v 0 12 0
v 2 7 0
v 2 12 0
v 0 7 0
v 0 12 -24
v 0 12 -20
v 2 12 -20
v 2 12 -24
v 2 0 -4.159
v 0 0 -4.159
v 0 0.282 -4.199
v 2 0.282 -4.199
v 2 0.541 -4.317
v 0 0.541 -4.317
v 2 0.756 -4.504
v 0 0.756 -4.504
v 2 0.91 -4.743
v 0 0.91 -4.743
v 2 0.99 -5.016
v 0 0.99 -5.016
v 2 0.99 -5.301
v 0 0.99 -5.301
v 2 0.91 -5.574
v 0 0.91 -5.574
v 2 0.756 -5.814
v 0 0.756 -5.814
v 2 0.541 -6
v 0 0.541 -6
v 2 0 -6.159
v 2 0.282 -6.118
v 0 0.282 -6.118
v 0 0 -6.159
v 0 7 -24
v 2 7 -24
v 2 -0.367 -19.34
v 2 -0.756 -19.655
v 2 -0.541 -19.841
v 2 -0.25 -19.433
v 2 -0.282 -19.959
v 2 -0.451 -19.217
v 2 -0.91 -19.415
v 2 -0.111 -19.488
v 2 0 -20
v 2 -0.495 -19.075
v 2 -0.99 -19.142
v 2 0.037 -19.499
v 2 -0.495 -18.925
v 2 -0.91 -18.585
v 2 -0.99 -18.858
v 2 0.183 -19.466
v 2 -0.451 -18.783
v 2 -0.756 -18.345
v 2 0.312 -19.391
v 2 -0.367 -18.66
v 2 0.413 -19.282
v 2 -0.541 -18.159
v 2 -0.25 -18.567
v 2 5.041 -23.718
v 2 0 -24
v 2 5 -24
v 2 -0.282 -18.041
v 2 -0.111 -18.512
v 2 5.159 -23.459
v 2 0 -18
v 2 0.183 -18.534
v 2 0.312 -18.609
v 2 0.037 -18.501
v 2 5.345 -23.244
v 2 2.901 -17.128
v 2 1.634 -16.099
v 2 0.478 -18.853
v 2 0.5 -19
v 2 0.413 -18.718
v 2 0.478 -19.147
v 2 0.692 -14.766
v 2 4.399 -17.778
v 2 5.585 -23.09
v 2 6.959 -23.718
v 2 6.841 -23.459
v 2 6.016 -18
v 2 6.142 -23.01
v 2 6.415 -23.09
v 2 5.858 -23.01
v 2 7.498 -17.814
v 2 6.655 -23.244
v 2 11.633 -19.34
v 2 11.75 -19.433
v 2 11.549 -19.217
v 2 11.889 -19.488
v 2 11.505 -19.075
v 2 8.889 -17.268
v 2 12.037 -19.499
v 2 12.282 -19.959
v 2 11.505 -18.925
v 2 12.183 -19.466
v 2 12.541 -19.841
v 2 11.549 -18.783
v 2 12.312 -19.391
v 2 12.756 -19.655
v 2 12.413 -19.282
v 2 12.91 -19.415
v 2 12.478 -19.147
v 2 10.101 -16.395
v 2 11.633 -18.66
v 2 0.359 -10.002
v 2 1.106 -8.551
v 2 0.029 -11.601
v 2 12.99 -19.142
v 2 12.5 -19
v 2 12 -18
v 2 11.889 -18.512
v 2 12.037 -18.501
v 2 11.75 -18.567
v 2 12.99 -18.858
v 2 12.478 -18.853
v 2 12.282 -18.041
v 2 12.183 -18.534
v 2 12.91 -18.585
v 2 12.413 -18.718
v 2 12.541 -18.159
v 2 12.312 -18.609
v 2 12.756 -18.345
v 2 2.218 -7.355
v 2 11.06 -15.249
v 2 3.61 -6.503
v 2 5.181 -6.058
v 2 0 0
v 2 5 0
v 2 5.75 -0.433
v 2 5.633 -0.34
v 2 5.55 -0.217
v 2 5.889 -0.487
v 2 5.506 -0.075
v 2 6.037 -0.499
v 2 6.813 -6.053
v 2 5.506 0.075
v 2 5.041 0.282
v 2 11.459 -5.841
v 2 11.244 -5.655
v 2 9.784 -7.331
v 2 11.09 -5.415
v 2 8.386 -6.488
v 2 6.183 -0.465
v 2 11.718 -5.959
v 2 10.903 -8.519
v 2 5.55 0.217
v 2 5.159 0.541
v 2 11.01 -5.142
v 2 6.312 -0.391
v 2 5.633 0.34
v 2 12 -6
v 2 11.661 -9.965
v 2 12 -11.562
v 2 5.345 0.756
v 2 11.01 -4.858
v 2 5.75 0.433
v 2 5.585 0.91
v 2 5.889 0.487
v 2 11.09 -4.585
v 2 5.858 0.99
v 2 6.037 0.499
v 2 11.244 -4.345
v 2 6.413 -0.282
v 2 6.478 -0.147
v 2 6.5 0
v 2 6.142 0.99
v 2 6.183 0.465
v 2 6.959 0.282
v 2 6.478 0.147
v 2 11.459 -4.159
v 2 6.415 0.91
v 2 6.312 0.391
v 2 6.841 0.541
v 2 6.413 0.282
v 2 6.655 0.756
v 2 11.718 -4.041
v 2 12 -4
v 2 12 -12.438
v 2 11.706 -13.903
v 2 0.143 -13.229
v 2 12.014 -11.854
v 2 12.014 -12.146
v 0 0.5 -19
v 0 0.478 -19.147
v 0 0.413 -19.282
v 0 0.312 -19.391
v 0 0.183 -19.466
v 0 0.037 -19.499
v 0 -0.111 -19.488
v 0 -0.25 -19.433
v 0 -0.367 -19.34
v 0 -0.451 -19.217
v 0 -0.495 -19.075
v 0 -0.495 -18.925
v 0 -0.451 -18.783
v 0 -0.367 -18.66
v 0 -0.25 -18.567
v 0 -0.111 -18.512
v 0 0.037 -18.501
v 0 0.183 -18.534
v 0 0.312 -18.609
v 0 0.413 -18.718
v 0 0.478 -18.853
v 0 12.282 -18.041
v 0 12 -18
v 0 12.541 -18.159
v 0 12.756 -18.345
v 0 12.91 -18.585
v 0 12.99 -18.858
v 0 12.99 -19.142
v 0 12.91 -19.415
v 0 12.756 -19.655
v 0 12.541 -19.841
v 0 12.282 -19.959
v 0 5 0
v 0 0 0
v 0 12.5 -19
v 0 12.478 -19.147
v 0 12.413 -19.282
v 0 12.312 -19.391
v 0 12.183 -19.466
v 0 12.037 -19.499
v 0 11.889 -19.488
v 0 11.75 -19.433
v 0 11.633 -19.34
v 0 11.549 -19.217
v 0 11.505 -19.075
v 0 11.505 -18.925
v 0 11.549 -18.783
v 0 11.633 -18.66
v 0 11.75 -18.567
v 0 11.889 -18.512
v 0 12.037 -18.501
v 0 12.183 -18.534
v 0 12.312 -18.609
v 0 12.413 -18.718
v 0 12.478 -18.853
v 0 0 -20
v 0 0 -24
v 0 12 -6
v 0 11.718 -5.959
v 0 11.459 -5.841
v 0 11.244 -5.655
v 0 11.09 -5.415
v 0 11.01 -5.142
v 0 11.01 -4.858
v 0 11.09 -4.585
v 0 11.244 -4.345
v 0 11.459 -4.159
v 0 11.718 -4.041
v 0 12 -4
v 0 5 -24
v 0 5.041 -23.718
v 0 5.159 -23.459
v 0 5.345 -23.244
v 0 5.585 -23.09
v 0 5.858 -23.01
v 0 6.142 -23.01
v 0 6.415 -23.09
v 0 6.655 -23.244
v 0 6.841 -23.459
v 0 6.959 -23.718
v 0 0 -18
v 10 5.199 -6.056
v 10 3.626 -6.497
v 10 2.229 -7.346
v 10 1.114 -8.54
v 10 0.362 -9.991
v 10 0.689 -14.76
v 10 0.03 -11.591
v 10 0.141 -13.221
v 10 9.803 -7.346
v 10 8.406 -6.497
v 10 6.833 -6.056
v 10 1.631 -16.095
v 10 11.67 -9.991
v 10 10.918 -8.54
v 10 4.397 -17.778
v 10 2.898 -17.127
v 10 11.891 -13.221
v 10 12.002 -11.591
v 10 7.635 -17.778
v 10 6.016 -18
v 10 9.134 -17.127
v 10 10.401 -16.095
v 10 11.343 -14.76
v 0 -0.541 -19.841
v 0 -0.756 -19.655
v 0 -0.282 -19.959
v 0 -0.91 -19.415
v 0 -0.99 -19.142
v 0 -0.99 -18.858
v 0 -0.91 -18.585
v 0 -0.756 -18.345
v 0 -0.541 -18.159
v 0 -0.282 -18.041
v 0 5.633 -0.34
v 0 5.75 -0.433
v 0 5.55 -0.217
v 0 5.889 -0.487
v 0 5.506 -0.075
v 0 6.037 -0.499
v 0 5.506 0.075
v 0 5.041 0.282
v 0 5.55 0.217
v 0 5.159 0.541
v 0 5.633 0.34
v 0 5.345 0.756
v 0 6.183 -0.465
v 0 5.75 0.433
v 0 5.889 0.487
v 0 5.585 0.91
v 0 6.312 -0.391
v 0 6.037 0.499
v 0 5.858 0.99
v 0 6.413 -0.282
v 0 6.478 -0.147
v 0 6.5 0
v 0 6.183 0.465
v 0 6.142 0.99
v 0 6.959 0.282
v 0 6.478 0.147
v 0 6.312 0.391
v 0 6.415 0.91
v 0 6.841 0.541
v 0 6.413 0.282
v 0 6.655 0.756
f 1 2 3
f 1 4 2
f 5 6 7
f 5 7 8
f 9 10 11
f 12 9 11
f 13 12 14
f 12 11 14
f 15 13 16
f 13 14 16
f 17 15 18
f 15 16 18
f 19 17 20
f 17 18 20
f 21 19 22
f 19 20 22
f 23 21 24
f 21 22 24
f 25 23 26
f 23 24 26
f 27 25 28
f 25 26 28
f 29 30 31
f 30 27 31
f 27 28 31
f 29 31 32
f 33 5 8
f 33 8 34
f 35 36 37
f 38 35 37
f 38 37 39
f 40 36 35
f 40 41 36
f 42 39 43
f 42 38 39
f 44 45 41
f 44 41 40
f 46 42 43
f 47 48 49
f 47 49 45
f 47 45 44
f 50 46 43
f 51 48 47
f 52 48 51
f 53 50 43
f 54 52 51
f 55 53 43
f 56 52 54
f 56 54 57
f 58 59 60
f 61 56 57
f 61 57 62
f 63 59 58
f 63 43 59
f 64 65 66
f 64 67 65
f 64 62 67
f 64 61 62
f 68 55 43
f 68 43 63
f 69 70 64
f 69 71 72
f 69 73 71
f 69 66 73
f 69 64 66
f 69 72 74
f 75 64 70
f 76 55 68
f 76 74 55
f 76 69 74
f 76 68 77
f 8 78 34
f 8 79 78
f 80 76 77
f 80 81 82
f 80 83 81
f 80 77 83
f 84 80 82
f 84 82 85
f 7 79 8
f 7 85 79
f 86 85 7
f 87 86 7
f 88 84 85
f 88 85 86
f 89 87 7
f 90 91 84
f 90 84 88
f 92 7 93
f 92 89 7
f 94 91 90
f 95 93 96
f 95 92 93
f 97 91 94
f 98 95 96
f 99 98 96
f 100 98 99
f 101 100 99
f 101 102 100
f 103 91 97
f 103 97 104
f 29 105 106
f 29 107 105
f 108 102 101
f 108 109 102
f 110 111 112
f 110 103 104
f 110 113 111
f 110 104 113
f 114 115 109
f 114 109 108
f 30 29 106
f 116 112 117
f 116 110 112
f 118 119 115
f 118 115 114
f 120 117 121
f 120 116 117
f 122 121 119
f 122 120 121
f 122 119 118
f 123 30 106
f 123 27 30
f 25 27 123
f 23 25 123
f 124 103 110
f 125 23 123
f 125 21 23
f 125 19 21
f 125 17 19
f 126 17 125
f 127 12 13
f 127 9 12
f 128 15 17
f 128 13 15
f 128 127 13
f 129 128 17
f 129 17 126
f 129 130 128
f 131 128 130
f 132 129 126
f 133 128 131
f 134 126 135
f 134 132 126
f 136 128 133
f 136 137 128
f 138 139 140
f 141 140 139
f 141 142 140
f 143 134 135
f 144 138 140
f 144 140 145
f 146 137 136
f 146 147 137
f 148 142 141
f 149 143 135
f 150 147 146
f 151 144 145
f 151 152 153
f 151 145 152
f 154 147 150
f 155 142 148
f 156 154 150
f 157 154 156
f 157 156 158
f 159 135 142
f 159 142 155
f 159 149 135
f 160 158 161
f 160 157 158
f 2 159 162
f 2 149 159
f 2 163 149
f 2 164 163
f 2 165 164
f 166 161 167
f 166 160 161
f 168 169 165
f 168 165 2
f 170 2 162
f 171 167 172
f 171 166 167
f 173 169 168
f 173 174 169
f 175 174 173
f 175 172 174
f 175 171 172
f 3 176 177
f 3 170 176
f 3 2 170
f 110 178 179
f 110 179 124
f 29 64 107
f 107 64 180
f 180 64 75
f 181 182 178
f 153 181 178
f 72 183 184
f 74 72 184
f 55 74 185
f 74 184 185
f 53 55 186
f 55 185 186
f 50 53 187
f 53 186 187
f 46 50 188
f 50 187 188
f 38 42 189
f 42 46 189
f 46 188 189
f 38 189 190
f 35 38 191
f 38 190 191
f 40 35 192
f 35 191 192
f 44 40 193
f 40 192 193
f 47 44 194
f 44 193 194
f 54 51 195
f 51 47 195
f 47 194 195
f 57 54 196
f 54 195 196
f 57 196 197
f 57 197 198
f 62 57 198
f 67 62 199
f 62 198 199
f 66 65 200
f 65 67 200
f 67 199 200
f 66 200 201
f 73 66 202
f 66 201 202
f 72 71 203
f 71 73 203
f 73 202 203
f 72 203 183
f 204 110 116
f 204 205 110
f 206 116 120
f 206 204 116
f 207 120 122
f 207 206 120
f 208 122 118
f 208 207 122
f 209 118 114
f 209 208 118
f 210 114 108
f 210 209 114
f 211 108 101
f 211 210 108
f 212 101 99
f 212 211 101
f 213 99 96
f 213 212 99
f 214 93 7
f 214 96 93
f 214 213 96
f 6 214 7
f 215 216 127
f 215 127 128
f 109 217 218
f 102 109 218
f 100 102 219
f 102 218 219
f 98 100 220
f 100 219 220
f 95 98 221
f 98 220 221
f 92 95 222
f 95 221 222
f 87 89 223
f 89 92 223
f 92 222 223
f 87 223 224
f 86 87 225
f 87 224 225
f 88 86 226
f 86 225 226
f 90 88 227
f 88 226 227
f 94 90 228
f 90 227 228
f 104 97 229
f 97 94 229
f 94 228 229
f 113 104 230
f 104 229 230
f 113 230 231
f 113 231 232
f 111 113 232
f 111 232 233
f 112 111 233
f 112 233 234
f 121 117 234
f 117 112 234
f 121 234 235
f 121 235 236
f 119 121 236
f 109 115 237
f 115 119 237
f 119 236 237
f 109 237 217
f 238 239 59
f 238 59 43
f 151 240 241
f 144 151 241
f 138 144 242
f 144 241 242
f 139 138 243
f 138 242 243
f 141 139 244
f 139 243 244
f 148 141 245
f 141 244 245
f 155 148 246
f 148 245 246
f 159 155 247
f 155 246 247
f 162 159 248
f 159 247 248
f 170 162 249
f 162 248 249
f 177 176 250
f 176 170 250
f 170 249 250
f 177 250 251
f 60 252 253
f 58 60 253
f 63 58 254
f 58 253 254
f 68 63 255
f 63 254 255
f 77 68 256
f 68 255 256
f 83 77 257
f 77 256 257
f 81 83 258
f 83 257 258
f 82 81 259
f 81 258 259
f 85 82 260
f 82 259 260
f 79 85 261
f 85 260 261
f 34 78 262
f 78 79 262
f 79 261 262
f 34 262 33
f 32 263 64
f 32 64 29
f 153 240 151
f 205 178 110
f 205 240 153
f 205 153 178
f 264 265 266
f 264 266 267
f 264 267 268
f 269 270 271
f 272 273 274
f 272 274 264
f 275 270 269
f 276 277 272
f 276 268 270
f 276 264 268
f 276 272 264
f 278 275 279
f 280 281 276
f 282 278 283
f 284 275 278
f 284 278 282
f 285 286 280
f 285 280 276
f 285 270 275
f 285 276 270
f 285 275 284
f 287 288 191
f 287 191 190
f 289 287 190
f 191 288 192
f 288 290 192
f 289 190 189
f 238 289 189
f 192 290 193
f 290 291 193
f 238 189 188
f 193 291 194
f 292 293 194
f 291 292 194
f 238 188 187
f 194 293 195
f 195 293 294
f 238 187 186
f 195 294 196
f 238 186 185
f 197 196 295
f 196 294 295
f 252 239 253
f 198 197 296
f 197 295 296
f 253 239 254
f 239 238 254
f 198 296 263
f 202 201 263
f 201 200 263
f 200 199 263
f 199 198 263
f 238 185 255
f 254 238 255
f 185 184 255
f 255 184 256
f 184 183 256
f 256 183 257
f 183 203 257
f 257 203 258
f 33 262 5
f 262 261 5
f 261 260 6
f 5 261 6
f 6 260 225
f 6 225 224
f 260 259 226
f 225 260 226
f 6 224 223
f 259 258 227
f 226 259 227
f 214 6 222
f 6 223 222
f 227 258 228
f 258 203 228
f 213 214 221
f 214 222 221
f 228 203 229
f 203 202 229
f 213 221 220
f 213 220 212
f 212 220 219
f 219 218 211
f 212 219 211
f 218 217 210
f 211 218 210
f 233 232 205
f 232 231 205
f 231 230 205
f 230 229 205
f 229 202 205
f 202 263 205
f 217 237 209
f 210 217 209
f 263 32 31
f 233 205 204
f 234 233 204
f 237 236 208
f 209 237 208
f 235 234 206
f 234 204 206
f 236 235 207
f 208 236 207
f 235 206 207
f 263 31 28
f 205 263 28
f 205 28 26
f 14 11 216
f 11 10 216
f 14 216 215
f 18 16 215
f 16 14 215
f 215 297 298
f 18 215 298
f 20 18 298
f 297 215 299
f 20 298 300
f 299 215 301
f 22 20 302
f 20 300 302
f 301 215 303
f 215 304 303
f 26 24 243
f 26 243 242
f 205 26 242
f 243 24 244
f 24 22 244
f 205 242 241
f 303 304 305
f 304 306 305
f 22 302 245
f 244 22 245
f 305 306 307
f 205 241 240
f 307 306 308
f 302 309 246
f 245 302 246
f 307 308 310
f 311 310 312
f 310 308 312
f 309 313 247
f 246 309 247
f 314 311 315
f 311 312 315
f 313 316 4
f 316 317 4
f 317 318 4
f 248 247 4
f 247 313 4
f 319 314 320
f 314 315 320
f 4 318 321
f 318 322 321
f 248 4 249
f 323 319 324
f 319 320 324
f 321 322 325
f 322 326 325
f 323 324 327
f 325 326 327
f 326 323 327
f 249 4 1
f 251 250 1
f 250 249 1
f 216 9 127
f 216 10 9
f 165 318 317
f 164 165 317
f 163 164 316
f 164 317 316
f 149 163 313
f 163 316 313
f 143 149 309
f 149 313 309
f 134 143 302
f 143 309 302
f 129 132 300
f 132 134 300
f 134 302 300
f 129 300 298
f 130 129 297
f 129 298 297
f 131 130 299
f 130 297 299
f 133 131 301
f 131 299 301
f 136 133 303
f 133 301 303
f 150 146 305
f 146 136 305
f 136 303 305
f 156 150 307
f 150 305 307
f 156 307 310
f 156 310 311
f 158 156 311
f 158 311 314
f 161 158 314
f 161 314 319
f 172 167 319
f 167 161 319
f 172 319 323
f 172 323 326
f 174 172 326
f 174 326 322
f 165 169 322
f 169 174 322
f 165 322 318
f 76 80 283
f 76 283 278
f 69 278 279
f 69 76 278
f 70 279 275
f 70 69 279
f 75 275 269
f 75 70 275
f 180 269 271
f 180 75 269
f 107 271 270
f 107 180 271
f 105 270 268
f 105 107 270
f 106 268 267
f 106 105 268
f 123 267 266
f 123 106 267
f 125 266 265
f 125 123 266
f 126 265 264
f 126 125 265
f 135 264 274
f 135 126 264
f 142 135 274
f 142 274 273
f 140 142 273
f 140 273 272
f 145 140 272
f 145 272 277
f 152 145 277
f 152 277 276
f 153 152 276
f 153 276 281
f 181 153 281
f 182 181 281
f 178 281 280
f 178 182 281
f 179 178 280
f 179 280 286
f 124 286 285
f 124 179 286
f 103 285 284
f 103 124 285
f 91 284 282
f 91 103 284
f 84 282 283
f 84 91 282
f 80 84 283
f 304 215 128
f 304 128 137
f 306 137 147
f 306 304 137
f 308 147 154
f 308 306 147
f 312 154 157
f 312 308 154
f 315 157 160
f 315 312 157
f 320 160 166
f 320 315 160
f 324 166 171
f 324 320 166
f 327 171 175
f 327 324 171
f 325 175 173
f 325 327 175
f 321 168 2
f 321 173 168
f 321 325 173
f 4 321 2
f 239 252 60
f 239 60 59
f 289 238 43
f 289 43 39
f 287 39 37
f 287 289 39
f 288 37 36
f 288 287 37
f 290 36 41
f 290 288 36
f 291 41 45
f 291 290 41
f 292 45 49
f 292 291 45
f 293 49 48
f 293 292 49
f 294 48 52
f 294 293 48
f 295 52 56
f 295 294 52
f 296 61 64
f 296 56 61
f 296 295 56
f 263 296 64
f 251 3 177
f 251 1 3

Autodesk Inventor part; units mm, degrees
ref_plane "YZ Plane" through (0, 0, 0) normal (1, 0, 0) x (0, 1, 0)
ref_plane "XZ Plane" through (0, 0, 0) normal (0, 1, 0) x (-1, 0, 0)
ref_plane "XY Plane" through (0, 0, 0) normal (0, 0, 1) x (1, 0, 0)
sketch "Náčrt1" plane through (0, 0, 0) normal (1, 0, 0) x (0, 1, 0)
  arc A0 (12, -4) -> (12, -6) centre (12, -5) ccw
  arc A1 (0, -6.1587) -> (0, -4.1587) centre (0, -5.1587) ccw
  arc A2 (12, -20) -> (12, -18) centre (12, -19) ccw
  arc A3 (0, -18) -> (0, -20) centre (0, -19) ccw
  line L0 (0, -4.1587) -> (0, 0)
  line L1 (12, 0) -> (12, -4)
  line L2 (12, -6) -> (12, -18)
  line L3 (12, -20) -> (12, -24)
  line L4 (0, -24) -> (0, -20)
  line L5 (0, -18) -> (0, -6.1587)
  circle A4 centre (12, -19) radius 0.5002
  circle A5 centre (0, -19) radius 0.5002
  arc A6 (7, 0) -> (5, 0) centre (6, 0) ccw
  line L6 (0, 0) -> (5, 0)
  line L7 (7, 0) -> (12, 0)
  circle A7 centre (6, 0) radius 0.5
  arc A8 (7, -24) -> (5, -24) centre (6, -24) ccw
  line L8 (12, -24) -> (7, -24)
  line L9 (5, -24) -> (0, -24)
  dimension "d0" = 12
  dimension "d1" = 24
  dimension "d2" = 2
  dimension "d3" = 2
  dimension "d4" = 5
  dimension "d5" = 5
  dimension "d6" = 5
  dimension "d7" = 2
  dimension "d8" = 1
extrude "Vysunutí1" add sketch "Náčrt1" along normal blind 2
sketch "Náčrt2" plane through (2, 0, 0) normal (1, 0, 0) x (0, 0, -1)
  circle A0 centre (12, 6.016) radius 6
  arc A1 (24, 7) -> (24, 5) centre (24, 6) ccw projected
  point P0 (0, 0)
  dimension "d11" = 12
  dimension "d12" = 12
extrude "Vysunutí2" add sketch "Náčrt2" along normal blind 8
equation "\"d6\" = d5"
properties part number "Grove - Oxygen Sensor"
